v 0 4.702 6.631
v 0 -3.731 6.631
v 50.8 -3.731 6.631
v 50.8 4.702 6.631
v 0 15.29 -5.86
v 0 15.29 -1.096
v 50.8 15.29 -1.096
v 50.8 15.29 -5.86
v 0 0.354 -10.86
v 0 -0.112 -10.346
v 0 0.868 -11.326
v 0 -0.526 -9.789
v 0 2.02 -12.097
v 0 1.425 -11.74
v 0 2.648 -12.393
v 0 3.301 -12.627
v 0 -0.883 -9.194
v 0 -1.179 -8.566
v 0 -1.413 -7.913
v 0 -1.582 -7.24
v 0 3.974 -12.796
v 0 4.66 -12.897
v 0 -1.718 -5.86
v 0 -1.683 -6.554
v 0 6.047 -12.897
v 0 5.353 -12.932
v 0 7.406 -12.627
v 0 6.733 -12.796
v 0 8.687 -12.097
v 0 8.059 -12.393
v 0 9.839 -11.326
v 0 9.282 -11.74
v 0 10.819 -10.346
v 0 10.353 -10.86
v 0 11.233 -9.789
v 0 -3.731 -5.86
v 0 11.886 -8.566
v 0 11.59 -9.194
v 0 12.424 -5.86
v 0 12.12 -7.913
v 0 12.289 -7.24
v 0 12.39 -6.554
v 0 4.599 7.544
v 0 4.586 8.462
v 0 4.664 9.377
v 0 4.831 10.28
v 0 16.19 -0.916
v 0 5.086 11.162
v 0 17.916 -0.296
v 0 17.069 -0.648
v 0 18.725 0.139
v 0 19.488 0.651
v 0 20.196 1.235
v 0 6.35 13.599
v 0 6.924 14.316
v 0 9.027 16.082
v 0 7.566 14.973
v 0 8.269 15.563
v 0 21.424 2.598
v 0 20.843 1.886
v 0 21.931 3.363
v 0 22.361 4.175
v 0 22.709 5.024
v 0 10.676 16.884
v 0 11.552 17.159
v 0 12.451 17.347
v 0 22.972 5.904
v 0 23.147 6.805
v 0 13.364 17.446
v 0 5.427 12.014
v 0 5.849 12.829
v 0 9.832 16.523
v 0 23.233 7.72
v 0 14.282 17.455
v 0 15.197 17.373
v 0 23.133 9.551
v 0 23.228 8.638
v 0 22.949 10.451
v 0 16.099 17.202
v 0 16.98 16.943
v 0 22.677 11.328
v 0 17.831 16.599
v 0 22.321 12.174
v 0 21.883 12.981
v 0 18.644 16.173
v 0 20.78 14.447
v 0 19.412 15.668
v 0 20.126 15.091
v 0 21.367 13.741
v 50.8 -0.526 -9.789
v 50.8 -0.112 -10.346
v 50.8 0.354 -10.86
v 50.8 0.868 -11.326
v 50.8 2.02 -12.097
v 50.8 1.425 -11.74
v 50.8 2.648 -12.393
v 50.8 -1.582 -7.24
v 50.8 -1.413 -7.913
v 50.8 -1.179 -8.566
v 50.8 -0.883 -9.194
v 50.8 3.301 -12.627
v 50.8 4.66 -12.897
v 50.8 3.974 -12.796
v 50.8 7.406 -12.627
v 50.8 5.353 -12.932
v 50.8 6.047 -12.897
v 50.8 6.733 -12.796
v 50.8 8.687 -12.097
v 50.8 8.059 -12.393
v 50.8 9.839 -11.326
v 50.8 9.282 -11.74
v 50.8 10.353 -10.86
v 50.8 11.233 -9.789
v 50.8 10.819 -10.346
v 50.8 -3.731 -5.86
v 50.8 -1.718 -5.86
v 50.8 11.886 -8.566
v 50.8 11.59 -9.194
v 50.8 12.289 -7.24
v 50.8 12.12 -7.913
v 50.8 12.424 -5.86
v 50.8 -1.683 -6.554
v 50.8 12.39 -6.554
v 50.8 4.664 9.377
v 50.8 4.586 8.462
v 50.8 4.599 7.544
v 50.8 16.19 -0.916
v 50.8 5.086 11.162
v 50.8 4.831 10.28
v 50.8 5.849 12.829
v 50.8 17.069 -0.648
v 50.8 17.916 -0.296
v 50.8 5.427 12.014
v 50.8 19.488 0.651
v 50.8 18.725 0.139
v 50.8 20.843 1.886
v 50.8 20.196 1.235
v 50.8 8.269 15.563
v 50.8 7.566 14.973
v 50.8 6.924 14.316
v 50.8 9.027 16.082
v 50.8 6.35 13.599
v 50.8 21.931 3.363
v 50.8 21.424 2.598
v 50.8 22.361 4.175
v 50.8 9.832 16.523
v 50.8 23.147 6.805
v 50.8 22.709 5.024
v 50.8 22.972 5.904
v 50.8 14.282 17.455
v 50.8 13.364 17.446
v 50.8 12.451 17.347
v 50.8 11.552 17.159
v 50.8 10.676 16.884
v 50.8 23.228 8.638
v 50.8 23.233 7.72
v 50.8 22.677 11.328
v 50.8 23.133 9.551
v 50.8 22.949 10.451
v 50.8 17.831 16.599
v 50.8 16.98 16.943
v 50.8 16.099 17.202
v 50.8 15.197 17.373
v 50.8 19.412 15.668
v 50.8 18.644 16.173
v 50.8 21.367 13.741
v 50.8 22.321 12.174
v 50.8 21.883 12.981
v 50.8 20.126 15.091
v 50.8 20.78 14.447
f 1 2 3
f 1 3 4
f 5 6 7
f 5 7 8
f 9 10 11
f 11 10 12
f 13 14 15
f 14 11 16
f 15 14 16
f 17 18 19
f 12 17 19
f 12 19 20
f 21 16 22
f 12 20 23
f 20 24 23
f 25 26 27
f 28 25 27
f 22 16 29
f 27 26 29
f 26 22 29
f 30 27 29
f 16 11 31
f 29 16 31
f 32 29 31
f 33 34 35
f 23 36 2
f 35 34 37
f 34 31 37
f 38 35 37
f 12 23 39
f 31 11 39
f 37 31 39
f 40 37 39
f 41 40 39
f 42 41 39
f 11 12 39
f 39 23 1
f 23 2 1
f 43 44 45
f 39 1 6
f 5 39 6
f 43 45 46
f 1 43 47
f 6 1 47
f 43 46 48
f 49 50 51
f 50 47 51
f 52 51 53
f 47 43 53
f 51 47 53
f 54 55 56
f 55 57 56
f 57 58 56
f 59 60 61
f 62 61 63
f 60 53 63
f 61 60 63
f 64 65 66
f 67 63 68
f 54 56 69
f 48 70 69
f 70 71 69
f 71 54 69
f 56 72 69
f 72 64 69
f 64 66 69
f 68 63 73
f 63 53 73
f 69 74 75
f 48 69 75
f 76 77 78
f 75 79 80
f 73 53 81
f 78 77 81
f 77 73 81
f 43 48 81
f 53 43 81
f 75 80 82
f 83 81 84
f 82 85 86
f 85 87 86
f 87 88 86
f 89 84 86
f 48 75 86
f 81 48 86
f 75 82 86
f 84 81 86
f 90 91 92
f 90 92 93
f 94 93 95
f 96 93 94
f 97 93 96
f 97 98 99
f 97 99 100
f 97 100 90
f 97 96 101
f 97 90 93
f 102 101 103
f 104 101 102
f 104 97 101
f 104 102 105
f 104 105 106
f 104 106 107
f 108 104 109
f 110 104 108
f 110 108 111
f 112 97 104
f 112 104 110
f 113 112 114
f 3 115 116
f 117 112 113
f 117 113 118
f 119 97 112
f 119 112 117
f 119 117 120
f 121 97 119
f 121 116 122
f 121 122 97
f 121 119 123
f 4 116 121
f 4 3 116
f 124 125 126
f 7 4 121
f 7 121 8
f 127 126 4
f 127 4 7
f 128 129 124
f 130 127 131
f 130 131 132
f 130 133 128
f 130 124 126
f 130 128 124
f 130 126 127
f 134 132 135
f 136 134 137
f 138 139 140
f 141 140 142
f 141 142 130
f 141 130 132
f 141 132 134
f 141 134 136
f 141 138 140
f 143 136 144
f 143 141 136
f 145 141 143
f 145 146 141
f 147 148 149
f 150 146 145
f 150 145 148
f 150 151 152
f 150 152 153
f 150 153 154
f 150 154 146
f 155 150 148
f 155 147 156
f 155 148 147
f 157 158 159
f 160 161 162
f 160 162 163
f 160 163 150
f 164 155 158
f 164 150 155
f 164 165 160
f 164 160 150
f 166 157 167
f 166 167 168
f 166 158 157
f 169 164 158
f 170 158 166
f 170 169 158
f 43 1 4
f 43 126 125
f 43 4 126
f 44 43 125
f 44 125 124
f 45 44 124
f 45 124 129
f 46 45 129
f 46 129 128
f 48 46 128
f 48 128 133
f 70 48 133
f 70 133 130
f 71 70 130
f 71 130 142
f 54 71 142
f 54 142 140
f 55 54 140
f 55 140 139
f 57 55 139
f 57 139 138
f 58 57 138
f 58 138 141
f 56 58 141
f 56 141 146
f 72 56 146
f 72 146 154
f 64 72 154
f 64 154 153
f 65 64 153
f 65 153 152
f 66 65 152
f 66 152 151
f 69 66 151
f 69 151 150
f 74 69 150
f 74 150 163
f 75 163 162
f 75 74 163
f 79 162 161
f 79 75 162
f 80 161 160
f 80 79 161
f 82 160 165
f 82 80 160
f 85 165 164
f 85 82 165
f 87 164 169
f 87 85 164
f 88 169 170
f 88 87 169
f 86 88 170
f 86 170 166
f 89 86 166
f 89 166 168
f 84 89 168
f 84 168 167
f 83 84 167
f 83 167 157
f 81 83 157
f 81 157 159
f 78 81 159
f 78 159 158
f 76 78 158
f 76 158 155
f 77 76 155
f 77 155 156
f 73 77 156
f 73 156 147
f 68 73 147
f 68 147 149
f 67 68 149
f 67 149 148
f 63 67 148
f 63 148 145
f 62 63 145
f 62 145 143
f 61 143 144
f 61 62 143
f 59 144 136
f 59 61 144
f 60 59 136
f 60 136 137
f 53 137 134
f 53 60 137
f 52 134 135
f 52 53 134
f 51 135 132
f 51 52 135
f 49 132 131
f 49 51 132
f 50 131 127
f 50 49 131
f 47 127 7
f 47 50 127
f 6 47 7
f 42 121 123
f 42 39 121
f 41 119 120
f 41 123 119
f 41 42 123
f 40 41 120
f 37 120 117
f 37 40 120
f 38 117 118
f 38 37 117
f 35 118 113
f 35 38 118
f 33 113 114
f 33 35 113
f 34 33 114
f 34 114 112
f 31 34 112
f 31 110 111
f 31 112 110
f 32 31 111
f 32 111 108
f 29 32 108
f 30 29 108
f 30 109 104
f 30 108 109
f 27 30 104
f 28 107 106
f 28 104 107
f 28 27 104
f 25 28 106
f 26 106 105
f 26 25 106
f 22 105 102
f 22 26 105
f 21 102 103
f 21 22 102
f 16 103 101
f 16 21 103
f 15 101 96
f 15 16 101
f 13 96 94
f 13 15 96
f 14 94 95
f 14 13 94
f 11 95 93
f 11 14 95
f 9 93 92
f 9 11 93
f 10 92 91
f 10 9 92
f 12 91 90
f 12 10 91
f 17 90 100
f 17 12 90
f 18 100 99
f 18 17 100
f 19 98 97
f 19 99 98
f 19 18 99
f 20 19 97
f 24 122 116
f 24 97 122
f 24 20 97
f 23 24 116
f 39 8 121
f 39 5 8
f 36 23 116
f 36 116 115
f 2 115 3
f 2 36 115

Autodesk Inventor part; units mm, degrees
ref_plane "YZ Plane" through (0, 0, 0) normal (1, 0, 0) x (0, 1, 0)
ref_plane "XZ Plane" through (0, 0, 0) normal (0, 1, 0) x (-1, 0, 0)
ref_plane "XY Plane" through (0, 0, 0) normal (0, 0, 1) x (1, 0, 0)
sketch "Sketch1" plane through (0, 0, 0) normal (1, 0, 0) x (0, 1, 0)
  circle A0 centre (5.3535, -5.8605) radius 7.071
  circle A1 centre (13.9111, 8.1317) radius 9.3306
  line L0 (-3.7313, 6.6311) -> (15.29, 6.6311)
  line L1 (15.29, 6.6311) -> (15.29, -5.8605)
  line L2 (15.29, -5.8605) -> (-3.7313, -5.8605)
  line L3 (-3.7313, -5.8605) -> (-3.7313, 6.6311)
  point P0 (0, 0)
extrude "Extrusion1" add sketch "Sketch1" along normal blind 50.8
properties part number "test"
